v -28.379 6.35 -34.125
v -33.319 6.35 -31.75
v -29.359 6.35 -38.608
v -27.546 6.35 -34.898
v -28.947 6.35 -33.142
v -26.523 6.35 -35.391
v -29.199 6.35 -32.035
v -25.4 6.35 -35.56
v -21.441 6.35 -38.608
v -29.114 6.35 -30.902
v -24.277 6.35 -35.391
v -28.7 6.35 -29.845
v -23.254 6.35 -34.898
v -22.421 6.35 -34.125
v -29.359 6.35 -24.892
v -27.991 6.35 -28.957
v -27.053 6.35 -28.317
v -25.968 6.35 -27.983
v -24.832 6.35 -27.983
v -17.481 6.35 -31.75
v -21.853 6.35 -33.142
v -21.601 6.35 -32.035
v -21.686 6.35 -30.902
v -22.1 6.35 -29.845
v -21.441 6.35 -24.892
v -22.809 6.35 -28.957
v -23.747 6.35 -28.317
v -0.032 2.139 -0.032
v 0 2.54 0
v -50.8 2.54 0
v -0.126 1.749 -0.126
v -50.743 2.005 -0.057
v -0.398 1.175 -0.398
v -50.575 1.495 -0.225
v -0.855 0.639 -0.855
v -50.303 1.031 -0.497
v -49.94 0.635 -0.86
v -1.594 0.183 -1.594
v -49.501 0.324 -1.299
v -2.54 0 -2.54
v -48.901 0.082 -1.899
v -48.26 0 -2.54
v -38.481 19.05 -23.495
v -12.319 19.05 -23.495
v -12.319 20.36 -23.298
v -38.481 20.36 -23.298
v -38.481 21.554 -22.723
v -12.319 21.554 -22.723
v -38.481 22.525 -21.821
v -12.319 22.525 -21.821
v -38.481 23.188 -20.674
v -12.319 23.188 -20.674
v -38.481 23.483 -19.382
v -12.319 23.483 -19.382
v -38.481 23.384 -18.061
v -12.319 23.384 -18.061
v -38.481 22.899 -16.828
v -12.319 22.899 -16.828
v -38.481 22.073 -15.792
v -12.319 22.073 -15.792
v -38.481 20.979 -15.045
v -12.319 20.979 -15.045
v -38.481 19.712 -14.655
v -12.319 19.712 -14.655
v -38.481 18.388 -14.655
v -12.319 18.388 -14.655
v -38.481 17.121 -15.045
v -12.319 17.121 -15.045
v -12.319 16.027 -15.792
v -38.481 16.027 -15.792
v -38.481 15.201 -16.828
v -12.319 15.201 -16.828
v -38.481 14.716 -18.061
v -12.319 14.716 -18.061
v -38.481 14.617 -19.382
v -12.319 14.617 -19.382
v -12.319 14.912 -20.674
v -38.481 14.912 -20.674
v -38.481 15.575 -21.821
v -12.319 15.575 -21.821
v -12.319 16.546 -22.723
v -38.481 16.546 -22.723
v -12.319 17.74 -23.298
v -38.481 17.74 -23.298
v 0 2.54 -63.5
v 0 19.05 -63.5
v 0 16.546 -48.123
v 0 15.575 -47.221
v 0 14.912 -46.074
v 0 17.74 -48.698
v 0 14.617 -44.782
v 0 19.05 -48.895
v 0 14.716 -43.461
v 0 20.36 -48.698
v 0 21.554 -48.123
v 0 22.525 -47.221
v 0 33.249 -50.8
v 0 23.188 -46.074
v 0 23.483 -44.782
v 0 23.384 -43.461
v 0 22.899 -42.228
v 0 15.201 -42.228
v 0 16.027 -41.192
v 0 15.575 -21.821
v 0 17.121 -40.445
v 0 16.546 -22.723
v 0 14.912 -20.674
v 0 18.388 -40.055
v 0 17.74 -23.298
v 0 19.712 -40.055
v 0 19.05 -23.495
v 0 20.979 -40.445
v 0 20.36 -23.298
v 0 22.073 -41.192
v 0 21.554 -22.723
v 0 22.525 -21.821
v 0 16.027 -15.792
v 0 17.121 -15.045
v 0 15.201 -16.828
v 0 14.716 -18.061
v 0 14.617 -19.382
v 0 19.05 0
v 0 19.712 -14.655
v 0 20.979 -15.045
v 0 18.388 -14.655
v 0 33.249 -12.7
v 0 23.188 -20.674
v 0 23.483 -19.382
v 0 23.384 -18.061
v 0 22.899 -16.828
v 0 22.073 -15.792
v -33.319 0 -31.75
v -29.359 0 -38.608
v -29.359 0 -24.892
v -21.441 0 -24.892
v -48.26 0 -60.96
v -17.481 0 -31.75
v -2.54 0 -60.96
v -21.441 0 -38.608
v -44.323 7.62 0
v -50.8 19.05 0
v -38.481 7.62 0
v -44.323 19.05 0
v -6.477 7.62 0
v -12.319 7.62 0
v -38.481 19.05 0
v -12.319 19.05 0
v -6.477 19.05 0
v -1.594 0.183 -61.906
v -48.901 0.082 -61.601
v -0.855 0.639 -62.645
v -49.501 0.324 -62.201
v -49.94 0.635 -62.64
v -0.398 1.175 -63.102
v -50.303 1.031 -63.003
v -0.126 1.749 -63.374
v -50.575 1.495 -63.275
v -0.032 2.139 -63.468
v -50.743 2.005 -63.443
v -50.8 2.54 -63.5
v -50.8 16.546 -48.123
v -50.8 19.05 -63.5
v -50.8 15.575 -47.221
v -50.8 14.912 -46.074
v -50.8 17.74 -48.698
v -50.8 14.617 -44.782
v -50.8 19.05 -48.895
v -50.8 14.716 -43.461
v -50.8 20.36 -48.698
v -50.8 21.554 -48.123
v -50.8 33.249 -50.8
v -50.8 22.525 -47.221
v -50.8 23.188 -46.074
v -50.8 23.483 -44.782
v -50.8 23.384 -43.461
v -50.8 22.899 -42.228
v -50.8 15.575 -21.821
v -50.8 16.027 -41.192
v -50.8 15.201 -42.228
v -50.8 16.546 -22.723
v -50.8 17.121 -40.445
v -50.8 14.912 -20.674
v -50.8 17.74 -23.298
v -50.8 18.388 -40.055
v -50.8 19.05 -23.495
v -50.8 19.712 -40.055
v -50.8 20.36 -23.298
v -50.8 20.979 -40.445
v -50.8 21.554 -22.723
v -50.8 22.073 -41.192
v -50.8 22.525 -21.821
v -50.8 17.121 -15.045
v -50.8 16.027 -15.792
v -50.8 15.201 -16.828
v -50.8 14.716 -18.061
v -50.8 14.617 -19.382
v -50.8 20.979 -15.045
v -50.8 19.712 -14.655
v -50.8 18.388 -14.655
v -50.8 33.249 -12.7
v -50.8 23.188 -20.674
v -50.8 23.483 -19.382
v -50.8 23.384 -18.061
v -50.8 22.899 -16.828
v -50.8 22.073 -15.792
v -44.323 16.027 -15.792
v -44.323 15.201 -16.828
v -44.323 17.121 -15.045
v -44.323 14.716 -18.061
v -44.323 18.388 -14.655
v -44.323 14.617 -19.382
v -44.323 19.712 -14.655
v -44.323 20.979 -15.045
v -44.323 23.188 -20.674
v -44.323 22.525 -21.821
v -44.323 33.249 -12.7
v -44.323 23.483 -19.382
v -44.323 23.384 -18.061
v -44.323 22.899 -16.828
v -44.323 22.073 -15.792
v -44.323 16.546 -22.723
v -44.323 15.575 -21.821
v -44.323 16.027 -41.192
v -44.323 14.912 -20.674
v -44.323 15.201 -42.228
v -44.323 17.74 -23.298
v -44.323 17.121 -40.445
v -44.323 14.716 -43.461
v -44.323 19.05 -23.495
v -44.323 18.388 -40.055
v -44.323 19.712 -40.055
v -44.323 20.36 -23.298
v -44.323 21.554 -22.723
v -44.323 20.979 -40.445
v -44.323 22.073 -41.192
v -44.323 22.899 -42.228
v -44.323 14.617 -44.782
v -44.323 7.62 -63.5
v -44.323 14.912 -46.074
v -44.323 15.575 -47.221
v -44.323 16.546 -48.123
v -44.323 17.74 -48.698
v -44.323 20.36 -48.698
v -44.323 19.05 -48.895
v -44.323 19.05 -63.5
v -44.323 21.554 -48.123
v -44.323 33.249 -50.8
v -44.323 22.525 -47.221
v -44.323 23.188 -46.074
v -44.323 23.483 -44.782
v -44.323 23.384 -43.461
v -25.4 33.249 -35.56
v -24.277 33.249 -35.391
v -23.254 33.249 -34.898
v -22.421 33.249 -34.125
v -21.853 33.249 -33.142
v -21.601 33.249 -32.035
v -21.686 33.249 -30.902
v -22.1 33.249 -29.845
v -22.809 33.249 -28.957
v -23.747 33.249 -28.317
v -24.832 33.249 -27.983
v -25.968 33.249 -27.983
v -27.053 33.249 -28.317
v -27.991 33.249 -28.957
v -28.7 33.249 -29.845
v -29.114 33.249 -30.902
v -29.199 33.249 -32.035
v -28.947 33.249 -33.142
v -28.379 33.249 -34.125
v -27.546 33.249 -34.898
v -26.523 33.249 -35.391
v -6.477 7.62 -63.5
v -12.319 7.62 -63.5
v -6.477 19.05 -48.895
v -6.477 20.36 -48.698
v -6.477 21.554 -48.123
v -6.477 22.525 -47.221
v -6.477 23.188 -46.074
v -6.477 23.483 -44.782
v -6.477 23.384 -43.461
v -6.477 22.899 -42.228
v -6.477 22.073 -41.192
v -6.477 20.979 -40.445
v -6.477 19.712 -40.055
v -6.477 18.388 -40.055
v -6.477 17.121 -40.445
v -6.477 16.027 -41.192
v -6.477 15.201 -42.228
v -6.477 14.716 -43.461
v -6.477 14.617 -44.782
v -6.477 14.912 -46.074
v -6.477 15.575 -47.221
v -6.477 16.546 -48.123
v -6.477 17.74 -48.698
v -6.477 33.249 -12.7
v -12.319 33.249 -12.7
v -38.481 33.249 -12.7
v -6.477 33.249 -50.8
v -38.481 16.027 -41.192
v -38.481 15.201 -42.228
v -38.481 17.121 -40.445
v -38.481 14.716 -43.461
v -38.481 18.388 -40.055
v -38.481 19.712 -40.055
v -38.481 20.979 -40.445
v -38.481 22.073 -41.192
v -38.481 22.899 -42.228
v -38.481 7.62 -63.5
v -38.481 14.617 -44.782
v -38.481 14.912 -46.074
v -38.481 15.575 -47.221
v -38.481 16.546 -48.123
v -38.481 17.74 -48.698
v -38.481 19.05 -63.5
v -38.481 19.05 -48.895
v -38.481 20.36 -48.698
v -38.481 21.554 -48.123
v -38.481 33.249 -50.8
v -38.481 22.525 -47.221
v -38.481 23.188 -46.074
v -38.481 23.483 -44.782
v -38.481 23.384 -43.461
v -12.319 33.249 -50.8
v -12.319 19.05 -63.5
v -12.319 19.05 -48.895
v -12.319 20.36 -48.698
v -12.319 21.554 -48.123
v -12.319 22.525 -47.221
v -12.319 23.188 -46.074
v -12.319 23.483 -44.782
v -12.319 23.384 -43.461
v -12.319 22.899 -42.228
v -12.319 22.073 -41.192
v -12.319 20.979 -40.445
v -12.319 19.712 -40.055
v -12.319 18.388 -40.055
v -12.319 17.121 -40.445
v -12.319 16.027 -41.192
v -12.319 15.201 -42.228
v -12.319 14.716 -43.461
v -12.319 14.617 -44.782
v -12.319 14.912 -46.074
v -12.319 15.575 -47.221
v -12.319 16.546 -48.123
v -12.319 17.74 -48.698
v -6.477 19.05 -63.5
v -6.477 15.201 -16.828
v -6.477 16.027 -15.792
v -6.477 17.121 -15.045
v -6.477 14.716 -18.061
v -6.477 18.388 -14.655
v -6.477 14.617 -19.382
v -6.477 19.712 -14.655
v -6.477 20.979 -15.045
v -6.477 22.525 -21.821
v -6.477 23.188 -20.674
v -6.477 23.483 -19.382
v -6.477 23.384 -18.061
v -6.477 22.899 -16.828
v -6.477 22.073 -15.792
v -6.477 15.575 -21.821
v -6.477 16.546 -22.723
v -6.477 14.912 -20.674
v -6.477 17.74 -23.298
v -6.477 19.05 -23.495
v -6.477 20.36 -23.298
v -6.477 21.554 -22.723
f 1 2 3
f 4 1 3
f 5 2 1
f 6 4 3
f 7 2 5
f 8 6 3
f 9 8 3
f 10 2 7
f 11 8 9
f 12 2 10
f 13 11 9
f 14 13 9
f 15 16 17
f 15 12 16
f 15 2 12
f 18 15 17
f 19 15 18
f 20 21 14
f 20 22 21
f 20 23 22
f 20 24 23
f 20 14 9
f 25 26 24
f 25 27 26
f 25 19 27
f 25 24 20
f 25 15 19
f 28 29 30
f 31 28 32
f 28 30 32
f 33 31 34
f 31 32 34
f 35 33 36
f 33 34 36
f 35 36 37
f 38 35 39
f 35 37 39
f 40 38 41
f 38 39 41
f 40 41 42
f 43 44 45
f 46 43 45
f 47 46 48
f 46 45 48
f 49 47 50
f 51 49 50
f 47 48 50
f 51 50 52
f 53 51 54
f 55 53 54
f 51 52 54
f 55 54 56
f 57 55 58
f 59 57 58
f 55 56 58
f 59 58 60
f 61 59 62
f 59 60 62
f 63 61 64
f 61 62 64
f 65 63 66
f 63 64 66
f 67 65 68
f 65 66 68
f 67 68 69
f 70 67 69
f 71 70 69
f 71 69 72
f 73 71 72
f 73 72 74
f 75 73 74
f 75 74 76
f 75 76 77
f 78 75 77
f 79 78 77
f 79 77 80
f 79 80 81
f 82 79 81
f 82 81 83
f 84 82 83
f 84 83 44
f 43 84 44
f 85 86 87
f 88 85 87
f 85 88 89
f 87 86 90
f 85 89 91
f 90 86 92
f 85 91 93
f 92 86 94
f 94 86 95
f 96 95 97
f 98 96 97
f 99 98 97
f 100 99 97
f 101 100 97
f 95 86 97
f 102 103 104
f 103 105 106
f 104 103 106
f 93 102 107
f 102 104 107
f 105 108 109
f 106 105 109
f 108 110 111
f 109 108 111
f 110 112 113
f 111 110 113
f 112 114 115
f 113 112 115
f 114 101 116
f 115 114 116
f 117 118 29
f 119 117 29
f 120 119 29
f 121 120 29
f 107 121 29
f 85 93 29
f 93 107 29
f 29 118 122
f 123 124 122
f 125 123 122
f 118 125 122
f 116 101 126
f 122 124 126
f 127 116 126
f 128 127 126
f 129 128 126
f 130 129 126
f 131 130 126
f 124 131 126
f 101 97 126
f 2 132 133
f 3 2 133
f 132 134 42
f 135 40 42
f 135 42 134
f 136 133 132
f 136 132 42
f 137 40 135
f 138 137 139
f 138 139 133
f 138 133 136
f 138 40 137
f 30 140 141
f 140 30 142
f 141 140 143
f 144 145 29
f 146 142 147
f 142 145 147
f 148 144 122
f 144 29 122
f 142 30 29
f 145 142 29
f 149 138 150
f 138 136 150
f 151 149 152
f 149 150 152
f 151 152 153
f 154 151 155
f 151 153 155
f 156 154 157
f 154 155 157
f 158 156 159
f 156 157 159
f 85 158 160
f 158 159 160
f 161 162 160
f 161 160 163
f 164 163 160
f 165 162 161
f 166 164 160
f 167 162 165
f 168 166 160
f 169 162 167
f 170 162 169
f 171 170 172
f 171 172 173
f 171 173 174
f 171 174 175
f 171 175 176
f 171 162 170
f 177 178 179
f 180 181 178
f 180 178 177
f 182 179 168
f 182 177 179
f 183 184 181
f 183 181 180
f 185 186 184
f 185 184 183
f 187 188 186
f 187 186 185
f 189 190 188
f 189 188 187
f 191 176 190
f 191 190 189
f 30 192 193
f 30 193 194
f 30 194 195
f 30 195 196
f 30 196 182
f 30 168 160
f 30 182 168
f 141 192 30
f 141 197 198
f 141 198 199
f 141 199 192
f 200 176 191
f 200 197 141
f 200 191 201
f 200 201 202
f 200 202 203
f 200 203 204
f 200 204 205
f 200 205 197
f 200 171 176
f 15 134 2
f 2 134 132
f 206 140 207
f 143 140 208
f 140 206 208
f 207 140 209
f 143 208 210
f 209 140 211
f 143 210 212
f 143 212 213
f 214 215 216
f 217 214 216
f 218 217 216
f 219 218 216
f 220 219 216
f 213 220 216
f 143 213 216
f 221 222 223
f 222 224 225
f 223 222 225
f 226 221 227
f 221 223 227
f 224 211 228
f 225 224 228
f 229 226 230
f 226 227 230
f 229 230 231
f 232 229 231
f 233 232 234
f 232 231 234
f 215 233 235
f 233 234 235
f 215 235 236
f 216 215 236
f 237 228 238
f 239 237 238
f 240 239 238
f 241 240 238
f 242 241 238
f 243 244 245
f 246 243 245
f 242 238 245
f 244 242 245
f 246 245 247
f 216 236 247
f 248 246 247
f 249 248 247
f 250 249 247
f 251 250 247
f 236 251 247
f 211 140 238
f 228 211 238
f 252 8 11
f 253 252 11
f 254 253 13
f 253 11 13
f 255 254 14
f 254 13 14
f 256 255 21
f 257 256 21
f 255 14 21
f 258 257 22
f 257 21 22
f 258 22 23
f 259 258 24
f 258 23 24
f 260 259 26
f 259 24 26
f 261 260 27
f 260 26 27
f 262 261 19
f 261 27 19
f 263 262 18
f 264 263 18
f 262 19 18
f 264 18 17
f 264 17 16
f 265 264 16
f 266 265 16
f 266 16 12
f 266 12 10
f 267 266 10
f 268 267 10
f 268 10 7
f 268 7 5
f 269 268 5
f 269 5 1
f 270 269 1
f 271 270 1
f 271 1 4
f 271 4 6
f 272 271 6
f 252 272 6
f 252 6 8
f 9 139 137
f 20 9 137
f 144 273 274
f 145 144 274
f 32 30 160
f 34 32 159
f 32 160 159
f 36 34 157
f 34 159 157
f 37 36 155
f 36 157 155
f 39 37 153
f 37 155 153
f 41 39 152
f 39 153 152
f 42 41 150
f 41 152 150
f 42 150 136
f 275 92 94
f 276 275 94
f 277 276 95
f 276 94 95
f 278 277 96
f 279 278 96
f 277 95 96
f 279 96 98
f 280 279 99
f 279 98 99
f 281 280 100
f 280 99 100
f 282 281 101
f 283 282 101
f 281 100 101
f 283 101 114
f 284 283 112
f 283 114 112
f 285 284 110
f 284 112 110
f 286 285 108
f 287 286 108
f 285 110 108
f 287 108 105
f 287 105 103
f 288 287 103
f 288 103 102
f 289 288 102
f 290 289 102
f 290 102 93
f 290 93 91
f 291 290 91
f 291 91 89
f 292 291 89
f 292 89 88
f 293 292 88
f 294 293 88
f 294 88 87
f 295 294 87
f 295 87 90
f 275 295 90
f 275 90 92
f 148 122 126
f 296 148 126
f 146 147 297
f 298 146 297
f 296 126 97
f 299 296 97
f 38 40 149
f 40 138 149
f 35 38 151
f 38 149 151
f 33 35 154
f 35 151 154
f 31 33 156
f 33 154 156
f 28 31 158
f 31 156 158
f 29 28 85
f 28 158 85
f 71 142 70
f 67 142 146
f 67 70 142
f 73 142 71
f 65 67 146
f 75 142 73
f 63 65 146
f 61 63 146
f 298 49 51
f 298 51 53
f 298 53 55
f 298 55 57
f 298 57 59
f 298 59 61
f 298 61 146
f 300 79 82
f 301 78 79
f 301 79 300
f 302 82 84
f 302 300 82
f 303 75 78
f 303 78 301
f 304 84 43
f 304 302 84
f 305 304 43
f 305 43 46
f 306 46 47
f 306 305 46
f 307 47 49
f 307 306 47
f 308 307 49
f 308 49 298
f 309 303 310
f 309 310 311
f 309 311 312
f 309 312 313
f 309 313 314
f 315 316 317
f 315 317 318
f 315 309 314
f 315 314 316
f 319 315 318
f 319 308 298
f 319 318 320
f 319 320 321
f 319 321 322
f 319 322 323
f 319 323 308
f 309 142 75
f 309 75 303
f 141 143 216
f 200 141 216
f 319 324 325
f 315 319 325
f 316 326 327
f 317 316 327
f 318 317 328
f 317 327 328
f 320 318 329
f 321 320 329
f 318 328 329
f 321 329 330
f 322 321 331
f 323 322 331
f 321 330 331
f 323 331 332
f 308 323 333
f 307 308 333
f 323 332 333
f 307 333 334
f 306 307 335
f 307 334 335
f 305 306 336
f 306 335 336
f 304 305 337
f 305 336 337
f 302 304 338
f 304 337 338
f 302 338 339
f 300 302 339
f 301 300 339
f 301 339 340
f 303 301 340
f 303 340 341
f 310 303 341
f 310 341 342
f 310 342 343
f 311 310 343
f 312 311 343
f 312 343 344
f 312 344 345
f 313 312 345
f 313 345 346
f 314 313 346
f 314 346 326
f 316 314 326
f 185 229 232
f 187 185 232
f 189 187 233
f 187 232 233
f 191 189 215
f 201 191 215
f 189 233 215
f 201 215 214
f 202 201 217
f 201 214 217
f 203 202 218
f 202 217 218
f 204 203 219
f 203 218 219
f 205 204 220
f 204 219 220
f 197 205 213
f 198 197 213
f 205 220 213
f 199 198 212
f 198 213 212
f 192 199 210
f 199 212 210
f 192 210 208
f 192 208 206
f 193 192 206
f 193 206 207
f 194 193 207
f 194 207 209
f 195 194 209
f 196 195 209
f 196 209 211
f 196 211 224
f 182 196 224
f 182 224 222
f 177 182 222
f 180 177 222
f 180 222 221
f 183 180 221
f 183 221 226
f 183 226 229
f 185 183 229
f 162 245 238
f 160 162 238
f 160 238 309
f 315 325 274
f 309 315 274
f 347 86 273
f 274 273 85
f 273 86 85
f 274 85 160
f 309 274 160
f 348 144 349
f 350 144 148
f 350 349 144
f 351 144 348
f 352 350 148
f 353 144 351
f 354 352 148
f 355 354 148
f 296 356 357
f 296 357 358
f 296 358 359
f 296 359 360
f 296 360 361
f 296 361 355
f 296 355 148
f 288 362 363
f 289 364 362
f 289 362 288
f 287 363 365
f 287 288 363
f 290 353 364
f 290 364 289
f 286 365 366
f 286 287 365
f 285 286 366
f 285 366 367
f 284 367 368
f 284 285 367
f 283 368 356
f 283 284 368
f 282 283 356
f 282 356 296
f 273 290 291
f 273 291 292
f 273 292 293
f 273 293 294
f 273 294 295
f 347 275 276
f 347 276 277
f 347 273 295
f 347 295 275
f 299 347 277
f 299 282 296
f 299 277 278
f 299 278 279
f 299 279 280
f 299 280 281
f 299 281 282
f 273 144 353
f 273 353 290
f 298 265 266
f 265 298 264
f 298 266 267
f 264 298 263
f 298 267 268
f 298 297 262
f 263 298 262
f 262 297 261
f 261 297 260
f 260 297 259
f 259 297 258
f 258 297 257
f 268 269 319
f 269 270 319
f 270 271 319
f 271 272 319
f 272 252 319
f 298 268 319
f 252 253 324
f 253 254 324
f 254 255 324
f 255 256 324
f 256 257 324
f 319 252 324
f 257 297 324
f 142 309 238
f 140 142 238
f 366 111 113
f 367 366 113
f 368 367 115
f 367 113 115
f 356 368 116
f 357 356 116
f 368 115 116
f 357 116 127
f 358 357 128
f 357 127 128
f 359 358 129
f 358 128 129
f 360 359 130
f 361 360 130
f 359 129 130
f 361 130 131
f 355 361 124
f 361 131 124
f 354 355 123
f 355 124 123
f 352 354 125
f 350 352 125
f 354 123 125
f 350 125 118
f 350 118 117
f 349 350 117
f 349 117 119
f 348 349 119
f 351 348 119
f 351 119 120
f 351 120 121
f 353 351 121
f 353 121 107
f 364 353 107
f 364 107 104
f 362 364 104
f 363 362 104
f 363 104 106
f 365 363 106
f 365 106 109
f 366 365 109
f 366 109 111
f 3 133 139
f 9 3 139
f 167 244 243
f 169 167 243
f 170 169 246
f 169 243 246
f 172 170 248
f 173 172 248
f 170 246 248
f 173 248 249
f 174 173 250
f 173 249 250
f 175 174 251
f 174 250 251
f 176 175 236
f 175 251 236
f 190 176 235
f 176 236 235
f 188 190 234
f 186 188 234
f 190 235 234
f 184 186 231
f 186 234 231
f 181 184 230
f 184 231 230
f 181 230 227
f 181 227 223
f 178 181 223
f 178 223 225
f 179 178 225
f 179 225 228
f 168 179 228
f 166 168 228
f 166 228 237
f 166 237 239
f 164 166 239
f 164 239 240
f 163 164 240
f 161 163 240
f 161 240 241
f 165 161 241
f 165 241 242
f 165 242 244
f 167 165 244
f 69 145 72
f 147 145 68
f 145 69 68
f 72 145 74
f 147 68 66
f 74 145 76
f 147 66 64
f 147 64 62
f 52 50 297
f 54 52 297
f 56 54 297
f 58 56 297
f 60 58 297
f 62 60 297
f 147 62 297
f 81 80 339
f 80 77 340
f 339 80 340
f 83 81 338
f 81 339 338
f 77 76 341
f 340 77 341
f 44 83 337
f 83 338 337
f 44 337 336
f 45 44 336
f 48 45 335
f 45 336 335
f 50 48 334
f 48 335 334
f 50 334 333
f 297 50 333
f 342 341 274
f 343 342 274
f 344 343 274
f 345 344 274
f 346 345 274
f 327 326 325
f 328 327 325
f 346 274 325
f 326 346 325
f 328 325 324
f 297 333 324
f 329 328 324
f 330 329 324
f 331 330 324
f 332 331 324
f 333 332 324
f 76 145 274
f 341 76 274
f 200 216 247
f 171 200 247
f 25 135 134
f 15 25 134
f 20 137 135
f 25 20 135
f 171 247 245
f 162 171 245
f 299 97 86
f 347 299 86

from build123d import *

# Parameters (mm, degrees)
SKETCH1_W           = 63.5
SKETCH1_H           = 6.35
BOSS_EXTRUDE1_DEPTH = 50.8
BOSS_EXTRUDE2_DEPTH = 50.8
SKETCH10_W          = 5.842
SKETCH10_H          = 25.629031657
CUT_EXTRUDE1_DEPTH  = 88.854357354
SKETCH11_R          = 4.445
CUT_EXTRUDE2_DEPTH  = 88.854357354
FILLET1_R           = 2.54
SKETCH24_R          = 3.81
CUT_EXTRUDE10_DEPTH = 88.854357354
CUT_EXTRUDE11_DEPTH = 6.35


with BuildPart() as part:
    # Sketch1 → Boss-Extrude1 (new body)
    with BuildSketch(Plane(origin=(0, 0, 0), x_dir=(0, 0, -1), z_dir=(1, 0, 0))):
        with Locations((31.75, 3.175)):
            Rectangle(SKETCH1_W, SKETCH1_H)
    extrude(amount=-BOSS_EXTRUDE1_DEPTH)

    # Sketch2 → Boss-Extrude2 (add)
    with BuildSketch(Plane(origin=(0, 0, 0), x_dir=(0, 0, -1), z_dir=(1, 0, 0))):
        Polygon((0, 6.35), (0, 19.05), (12.7, 33.249031657), (50.8, 33.249031657), (63.5, 19.05), (63.5, 6.35), align=None)
    extrude(amount=-BOSS_EXTRUDE2_DEPTH)

    # Sketch10 → Cut-Extrude1 (cut, through all)
    with BuildSketch(Plane(origin=(0, 0, -63.5), x_dir=(-1, 0, 0), z_dir=(0, 0, -1))):
        with Locations((9.398, 20.434515829)):
            Rectangle(SKETCH10_W, SKETCH10_H)
        with Locations((41.402, 20.434515829)):
            Rectangle(SKETCH10_W, SKETCH10_H)
    extrude(amount=-CUT_EXTRUDE1_DEPTH, mode=Mode.SUBTRACT)

    # Sketch11 → Cut-Extrude2 (cut, through all)
    with BuildSketch(Plane(origin=(0, 0, 0), x_dir=(0, 0, -1), z_dir=(1, 0, 0))):
        with Locations((19.05, 19.05)):
            Circle(SKETCH11_R)
        with Locations((44.45, 19.05)):
            Circle(SKETCH11_R)
    extrude(amount=-CUT_EXTRUDE2_DEPTH, mode=Mode.SUBTRACT)

    # Fillet1
    fillet1_edges = [part.edges().sort_by_distance(p)[0] for p in [
        (0, 0, -31.75),
        (-50.8, 0, -31.75),
        (-25.4, 0, -63.5),
        (-25.4, 0, 0),
    ]]
    fillet(fillet1_edges, radius=FILLET1_R)

    # Sketch24 → Cut-Extrude10 (cut, through all)
    with BuildSketch(Plane.XZ):
        with Locations(Location((-25.4, -31.75, 0), (0, 0, 270))):
            Circle(SKETCH24_R)
    extrude(amount=-CUT_EXTRUDE10_DEPTH, mode=Mode.SUBTRACT)

    # Sketch25 → Cut-Extrude11 (cut)
    with BuildSketch(Plane.XZ):
        Polygon((-29.359468146, -24.892), (-33.318936292, -31.75), (-29.359468146, -38.608), (-21.440531854, -38.608), (-17.481063708, -31.75), (-21.440531854, -24.892), align=None)
    extrude(amount=-CUT_EXTRUDE11_DEPTH, mode=Mode.SUBTRACT)


solid = part.part
